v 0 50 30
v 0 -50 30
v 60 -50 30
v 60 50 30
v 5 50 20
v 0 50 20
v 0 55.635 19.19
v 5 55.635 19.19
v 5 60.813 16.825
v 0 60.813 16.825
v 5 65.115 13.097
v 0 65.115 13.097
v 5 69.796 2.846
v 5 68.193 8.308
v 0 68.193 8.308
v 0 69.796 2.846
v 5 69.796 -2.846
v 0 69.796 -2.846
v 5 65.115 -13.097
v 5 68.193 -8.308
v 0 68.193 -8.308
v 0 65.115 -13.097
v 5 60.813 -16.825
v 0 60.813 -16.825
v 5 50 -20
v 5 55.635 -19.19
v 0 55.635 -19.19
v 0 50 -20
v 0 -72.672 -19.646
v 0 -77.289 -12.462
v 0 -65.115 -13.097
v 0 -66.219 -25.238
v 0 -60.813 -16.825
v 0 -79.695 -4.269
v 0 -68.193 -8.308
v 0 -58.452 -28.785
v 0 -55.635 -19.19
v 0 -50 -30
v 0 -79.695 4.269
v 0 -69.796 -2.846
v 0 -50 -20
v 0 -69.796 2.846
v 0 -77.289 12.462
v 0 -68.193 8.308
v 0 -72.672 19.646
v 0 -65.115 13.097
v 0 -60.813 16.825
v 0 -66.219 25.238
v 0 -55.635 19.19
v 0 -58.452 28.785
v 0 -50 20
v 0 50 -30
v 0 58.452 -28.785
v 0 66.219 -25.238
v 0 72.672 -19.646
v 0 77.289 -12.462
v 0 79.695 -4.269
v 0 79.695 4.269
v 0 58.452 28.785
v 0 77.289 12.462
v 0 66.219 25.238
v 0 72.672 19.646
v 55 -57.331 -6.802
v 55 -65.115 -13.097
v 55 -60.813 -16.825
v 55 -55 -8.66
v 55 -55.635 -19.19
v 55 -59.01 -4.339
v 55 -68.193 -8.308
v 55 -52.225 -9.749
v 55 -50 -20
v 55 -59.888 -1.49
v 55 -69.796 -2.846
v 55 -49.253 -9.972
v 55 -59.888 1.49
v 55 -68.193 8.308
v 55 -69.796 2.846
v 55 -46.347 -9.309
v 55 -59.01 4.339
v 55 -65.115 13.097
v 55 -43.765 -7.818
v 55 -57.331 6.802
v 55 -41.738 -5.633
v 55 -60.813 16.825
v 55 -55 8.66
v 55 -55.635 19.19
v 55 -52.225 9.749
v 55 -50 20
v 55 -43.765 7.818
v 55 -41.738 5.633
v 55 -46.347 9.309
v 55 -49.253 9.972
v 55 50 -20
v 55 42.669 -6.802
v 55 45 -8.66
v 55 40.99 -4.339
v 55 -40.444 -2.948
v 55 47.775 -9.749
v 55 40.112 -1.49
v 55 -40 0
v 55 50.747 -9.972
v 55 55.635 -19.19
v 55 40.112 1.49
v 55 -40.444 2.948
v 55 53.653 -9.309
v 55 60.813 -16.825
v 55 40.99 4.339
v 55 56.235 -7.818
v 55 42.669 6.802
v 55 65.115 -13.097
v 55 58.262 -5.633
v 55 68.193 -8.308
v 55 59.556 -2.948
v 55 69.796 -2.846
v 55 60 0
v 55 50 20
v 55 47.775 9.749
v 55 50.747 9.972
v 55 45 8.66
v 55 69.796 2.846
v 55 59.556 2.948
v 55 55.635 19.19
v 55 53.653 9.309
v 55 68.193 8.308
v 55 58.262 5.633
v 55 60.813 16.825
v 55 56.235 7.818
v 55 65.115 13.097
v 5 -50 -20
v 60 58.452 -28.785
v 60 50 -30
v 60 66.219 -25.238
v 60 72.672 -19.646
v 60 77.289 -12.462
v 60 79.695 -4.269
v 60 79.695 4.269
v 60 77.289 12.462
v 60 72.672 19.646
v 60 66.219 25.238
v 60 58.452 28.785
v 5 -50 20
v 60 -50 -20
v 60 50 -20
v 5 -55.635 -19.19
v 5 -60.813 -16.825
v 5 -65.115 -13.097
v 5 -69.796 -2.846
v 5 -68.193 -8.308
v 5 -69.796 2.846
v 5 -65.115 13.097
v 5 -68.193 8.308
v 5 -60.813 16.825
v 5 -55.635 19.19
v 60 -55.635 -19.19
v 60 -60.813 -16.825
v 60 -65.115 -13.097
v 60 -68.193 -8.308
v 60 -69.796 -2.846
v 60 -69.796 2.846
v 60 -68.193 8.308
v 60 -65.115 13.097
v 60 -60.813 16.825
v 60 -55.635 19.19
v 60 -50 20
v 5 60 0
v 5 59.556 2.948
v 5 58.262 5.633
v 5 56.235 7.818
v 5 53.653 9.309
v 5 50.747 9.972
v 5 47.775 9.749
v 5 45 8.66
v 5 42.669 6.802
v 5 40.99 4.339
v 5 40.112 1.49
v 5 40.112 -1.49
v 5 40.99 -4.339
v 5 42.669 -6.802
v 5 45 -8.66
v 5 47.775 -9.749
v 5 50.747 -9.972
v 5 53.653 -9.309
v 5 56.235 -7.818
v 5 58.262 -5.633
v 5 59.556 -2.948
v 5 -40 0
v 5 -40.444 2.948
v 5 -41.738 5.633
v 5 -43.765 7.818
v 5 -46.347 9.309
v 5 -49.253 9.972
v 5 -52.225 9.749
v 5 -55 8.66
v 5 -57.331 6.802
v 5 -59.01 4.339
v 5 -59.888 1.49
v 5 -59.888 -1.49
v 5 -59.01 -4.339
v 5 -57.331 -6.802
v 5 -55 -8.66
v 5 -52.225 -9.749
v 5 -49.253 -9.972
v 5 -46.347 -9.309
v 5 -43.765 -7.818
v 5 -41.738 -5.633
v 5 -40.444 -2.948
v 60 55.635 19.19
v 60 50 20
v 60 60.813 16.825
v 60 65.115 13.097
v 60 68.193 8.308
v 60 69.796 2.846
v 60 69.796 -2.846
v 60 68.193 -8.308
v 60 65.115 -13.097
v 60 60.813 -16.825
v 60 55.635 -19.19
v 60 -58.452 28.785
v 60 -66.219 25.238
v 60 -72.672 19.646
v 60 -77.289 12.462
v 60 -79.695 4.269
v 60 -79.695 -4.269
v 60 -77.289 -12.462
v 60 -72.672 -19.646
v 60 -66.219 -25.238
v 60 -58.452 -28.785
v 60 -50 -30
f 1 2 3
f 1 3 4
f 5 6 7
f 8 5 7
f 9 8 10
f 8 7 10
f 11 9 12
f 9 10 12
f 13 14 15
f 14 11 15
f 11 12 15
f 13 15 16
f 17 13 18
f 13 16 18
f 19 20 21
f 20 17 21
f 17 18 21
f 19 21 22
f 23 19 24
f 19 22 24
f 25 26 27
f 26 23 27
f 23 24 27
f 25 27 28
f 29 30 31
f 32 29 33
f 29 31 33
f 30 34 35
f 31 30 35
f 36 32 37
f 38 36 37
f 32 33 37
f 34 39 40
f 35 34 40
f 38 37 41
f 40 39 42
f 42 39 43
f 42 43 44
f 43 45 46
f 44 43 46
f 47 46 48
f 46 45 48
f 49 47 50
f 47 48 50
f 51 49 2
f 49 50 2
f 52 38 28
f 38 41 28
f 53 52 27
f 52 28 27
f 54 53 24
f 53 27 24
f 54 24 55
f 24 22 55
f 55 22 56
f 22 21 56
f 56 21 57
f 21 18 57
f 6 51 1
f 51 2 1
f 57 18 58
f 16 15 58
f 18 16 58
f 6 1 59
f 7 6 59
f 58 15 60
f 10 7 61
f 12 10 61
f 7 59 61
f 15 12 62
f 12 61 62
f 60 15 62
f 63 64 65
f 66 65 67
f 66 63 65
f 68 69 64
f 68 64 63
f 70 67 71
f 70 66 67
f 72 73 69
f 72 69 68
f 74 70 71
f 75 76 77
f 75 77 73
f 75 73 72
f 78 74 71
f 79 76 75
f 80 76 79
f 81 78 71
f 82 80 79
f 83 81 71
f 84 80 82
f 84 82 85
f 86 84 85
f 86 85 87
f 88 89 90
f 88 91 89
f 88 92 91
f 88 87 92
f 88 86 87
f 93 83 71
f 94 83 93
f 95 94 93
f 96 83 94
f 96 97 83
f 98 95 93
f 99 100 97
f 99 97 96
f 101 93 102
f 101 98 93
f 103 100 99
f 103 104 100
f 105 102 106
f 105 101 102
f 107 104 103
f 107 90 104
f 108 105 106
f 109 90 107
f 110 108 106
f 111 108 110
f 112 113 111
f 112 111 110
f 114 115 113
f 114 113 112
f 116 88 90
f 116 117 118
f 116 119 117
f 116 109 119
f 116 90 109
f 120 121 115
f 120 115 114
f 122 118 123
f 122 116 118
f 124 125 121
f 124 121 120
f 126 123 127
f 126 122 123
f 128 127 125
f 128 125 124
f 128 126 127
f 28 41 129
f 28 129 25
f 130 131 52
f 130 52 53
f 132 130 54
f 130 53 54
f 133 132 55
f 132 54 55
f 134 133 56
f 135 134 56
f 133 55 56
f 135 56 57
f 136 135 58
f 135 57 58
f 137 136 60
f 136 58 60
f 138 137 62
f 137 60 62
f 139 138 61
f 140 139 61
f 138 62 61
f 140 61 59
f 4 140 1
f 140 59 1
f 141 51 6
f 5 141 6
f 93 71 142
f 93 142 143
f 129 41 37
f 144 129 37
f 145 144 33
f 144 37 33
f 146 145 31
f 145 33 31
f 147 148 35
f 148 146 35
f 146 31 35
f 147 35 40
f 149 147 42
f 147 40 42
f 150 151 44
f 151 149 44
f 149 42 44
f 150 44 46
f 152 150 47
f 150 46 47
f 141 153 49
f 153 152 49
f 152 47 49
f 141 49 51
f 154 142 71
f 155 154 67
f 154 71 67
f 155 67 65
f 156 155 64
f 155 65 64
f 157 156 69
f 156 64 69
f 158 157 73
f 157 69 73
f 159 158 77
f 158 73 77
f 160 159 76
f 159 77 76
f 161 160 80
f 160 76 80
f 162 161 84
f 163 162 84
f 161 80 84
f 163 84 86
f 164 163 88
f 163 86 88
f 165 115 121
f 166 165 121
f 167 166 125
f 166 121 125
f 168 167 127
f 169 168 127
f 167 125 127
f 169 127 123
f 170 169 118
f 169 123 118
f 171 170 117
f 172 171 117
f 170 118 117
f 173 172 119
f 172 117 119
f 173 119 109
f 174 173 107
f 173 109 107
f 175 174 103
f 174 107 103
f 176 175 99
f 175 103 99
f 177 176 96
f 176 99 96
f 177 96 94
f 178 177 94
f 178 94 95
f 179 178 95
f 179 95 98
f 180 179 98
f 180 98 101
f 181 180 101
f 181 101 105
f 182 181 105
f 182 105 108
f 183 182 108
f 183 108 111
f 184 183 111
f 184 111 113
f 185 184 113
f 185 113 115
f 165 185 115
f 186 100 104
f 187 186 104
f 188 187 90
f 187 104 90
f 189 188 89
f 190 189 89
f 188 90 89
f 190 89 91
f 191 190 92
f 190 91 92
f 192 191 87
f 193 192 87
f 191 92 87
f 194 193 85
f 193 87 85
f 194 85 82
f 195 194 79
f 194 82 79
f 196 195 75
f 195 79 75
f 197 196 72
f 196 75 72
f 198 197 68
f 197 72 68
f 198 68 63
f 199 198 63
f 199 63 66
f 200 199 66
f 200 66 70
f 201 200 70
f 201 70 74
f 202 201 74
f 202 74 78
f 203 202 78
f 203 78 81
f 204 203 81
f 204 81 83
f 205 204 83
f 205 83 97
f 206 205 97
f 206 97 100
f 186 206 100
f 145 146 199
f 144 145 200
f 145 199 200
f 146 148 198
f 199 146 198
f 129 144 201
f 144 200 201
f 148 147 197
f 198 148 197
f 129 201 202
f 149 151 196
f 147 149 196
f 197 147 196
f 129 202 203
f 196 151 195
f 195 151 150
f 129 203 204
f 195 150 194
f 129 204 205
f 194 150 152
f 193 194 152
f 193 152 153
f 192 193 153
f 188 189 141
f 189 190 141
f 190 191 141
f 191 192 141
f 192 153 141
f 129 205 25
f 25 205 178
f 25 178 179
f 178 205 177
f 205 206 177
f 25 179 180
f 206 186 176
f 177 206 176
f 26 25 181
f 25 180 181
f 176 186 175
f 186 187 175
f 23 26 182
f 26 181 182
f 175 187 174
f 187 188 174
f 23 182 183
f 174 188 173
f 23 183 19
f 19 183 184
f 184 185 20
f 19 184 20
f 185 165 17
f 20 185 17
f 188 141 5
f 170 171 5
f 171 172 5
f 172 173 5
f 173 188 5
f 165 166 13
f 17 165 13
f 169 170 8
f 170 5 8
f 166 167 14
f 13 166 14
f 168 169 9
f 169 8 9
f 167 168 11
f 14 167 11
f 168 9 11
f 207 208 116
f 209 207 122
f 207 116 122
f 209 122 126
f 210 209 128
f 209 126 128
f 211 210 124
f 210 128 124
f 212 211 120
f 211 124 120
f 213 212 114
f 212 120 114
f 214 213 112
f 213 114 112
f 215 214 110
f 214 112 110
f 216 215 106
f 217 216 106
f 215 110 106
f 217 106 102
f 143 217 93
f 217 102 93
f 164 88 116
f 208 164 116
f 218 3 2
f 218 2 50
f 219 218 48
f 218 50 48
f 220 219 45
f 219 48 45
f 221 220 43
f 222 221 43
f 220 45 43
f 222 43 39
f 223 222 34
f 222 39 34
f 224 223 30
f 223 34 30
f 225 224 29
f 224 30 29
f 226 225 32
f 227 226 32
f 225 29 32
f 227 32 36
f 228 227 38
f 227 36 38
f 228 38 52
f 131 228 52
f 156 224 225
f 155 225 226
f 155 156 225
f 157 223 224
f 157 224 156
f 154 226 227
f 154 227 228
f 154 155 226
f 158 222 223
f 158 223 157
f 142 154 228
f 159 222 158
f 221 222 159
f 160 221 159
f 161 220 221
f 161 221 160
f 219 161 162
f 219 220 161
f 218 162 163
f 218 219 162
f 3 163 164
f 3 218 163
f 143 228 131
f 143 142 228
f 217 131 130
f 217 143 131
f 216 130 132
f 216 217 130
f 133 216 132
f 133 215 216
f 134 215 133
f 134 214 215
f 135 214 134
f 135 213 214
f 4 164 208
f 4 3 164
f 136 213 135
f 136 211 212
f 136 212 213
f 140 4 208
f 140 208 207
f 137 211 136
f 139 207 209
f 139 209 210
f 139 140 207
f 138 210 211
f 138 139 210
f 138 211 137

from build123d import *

# Parameters (mm, degrees)
F0_W     = 100
F0_H     = 10
F1_DEPTH = 60
F2_START = 5
F0_H_2   = 40
F2_DEPTH = 50
F3_R     = 10
F4_DEPTH = 55.001


with BuildPart() as f1:
    # F0 (on Right) → F1 (new body)
    with BuildSketch(Plane.YZ):
        with Locations((0, 25)):
            Rectangle(F0_W, F0_H)
        with BuildLine():
            Line((-50, 20), (-50, 30))
            ThreePointArc((-50, 30), (-80, 0), (-50, -30))
            Line((-50, -30), (-50, -20))
            ThreePointArc((-50, -20), (-70, 0), (-50, 20))
        make_face()
        with BuildLine():
            ThreePointArc((50, -30), (80, 0), (50, 30))
            Line((50, 30), (50, 20))
            ThreePointArc((50, 20), (70, 0), (50, -20))
            Line((50, -20), (50, -30))
        make_face()
        with Locations((0, -25)):
            Rectangle(F0_W, F0_H)
    extrude(amount=F1_DEPTH)

    # F0 (on Right) → F2 (join)
    with BuildSketch(Plane.YZ.offset(F2_START)):
        Rectangle(F0_W, F0_H_2)
        with BuildLine():
            ThreePointArc((50, -20), (70, 0), (50, 20))
            Line((50, 20), (50, -20))
        make_face()
        with BuildLine():
            Line((-50, -20), (-50, 20))
            ThreePointArc((-50, 20), (-70, 0), (-50, -20))
        make_face()
    extrude(amount=F2_DEPTH)

    # F3 (on face) → F4 (cut, through all)
    with BuildSketch(Plane.YZ.offset(55)):
        with Locations((-50, 0)):
            Circle(F3_R)
        with Locations((50, 0)):
            Circle(F3_R)
    extrude(amount=-F4_DEPTH, mode=Mode.SUBTRACT)


solid = f1.part
